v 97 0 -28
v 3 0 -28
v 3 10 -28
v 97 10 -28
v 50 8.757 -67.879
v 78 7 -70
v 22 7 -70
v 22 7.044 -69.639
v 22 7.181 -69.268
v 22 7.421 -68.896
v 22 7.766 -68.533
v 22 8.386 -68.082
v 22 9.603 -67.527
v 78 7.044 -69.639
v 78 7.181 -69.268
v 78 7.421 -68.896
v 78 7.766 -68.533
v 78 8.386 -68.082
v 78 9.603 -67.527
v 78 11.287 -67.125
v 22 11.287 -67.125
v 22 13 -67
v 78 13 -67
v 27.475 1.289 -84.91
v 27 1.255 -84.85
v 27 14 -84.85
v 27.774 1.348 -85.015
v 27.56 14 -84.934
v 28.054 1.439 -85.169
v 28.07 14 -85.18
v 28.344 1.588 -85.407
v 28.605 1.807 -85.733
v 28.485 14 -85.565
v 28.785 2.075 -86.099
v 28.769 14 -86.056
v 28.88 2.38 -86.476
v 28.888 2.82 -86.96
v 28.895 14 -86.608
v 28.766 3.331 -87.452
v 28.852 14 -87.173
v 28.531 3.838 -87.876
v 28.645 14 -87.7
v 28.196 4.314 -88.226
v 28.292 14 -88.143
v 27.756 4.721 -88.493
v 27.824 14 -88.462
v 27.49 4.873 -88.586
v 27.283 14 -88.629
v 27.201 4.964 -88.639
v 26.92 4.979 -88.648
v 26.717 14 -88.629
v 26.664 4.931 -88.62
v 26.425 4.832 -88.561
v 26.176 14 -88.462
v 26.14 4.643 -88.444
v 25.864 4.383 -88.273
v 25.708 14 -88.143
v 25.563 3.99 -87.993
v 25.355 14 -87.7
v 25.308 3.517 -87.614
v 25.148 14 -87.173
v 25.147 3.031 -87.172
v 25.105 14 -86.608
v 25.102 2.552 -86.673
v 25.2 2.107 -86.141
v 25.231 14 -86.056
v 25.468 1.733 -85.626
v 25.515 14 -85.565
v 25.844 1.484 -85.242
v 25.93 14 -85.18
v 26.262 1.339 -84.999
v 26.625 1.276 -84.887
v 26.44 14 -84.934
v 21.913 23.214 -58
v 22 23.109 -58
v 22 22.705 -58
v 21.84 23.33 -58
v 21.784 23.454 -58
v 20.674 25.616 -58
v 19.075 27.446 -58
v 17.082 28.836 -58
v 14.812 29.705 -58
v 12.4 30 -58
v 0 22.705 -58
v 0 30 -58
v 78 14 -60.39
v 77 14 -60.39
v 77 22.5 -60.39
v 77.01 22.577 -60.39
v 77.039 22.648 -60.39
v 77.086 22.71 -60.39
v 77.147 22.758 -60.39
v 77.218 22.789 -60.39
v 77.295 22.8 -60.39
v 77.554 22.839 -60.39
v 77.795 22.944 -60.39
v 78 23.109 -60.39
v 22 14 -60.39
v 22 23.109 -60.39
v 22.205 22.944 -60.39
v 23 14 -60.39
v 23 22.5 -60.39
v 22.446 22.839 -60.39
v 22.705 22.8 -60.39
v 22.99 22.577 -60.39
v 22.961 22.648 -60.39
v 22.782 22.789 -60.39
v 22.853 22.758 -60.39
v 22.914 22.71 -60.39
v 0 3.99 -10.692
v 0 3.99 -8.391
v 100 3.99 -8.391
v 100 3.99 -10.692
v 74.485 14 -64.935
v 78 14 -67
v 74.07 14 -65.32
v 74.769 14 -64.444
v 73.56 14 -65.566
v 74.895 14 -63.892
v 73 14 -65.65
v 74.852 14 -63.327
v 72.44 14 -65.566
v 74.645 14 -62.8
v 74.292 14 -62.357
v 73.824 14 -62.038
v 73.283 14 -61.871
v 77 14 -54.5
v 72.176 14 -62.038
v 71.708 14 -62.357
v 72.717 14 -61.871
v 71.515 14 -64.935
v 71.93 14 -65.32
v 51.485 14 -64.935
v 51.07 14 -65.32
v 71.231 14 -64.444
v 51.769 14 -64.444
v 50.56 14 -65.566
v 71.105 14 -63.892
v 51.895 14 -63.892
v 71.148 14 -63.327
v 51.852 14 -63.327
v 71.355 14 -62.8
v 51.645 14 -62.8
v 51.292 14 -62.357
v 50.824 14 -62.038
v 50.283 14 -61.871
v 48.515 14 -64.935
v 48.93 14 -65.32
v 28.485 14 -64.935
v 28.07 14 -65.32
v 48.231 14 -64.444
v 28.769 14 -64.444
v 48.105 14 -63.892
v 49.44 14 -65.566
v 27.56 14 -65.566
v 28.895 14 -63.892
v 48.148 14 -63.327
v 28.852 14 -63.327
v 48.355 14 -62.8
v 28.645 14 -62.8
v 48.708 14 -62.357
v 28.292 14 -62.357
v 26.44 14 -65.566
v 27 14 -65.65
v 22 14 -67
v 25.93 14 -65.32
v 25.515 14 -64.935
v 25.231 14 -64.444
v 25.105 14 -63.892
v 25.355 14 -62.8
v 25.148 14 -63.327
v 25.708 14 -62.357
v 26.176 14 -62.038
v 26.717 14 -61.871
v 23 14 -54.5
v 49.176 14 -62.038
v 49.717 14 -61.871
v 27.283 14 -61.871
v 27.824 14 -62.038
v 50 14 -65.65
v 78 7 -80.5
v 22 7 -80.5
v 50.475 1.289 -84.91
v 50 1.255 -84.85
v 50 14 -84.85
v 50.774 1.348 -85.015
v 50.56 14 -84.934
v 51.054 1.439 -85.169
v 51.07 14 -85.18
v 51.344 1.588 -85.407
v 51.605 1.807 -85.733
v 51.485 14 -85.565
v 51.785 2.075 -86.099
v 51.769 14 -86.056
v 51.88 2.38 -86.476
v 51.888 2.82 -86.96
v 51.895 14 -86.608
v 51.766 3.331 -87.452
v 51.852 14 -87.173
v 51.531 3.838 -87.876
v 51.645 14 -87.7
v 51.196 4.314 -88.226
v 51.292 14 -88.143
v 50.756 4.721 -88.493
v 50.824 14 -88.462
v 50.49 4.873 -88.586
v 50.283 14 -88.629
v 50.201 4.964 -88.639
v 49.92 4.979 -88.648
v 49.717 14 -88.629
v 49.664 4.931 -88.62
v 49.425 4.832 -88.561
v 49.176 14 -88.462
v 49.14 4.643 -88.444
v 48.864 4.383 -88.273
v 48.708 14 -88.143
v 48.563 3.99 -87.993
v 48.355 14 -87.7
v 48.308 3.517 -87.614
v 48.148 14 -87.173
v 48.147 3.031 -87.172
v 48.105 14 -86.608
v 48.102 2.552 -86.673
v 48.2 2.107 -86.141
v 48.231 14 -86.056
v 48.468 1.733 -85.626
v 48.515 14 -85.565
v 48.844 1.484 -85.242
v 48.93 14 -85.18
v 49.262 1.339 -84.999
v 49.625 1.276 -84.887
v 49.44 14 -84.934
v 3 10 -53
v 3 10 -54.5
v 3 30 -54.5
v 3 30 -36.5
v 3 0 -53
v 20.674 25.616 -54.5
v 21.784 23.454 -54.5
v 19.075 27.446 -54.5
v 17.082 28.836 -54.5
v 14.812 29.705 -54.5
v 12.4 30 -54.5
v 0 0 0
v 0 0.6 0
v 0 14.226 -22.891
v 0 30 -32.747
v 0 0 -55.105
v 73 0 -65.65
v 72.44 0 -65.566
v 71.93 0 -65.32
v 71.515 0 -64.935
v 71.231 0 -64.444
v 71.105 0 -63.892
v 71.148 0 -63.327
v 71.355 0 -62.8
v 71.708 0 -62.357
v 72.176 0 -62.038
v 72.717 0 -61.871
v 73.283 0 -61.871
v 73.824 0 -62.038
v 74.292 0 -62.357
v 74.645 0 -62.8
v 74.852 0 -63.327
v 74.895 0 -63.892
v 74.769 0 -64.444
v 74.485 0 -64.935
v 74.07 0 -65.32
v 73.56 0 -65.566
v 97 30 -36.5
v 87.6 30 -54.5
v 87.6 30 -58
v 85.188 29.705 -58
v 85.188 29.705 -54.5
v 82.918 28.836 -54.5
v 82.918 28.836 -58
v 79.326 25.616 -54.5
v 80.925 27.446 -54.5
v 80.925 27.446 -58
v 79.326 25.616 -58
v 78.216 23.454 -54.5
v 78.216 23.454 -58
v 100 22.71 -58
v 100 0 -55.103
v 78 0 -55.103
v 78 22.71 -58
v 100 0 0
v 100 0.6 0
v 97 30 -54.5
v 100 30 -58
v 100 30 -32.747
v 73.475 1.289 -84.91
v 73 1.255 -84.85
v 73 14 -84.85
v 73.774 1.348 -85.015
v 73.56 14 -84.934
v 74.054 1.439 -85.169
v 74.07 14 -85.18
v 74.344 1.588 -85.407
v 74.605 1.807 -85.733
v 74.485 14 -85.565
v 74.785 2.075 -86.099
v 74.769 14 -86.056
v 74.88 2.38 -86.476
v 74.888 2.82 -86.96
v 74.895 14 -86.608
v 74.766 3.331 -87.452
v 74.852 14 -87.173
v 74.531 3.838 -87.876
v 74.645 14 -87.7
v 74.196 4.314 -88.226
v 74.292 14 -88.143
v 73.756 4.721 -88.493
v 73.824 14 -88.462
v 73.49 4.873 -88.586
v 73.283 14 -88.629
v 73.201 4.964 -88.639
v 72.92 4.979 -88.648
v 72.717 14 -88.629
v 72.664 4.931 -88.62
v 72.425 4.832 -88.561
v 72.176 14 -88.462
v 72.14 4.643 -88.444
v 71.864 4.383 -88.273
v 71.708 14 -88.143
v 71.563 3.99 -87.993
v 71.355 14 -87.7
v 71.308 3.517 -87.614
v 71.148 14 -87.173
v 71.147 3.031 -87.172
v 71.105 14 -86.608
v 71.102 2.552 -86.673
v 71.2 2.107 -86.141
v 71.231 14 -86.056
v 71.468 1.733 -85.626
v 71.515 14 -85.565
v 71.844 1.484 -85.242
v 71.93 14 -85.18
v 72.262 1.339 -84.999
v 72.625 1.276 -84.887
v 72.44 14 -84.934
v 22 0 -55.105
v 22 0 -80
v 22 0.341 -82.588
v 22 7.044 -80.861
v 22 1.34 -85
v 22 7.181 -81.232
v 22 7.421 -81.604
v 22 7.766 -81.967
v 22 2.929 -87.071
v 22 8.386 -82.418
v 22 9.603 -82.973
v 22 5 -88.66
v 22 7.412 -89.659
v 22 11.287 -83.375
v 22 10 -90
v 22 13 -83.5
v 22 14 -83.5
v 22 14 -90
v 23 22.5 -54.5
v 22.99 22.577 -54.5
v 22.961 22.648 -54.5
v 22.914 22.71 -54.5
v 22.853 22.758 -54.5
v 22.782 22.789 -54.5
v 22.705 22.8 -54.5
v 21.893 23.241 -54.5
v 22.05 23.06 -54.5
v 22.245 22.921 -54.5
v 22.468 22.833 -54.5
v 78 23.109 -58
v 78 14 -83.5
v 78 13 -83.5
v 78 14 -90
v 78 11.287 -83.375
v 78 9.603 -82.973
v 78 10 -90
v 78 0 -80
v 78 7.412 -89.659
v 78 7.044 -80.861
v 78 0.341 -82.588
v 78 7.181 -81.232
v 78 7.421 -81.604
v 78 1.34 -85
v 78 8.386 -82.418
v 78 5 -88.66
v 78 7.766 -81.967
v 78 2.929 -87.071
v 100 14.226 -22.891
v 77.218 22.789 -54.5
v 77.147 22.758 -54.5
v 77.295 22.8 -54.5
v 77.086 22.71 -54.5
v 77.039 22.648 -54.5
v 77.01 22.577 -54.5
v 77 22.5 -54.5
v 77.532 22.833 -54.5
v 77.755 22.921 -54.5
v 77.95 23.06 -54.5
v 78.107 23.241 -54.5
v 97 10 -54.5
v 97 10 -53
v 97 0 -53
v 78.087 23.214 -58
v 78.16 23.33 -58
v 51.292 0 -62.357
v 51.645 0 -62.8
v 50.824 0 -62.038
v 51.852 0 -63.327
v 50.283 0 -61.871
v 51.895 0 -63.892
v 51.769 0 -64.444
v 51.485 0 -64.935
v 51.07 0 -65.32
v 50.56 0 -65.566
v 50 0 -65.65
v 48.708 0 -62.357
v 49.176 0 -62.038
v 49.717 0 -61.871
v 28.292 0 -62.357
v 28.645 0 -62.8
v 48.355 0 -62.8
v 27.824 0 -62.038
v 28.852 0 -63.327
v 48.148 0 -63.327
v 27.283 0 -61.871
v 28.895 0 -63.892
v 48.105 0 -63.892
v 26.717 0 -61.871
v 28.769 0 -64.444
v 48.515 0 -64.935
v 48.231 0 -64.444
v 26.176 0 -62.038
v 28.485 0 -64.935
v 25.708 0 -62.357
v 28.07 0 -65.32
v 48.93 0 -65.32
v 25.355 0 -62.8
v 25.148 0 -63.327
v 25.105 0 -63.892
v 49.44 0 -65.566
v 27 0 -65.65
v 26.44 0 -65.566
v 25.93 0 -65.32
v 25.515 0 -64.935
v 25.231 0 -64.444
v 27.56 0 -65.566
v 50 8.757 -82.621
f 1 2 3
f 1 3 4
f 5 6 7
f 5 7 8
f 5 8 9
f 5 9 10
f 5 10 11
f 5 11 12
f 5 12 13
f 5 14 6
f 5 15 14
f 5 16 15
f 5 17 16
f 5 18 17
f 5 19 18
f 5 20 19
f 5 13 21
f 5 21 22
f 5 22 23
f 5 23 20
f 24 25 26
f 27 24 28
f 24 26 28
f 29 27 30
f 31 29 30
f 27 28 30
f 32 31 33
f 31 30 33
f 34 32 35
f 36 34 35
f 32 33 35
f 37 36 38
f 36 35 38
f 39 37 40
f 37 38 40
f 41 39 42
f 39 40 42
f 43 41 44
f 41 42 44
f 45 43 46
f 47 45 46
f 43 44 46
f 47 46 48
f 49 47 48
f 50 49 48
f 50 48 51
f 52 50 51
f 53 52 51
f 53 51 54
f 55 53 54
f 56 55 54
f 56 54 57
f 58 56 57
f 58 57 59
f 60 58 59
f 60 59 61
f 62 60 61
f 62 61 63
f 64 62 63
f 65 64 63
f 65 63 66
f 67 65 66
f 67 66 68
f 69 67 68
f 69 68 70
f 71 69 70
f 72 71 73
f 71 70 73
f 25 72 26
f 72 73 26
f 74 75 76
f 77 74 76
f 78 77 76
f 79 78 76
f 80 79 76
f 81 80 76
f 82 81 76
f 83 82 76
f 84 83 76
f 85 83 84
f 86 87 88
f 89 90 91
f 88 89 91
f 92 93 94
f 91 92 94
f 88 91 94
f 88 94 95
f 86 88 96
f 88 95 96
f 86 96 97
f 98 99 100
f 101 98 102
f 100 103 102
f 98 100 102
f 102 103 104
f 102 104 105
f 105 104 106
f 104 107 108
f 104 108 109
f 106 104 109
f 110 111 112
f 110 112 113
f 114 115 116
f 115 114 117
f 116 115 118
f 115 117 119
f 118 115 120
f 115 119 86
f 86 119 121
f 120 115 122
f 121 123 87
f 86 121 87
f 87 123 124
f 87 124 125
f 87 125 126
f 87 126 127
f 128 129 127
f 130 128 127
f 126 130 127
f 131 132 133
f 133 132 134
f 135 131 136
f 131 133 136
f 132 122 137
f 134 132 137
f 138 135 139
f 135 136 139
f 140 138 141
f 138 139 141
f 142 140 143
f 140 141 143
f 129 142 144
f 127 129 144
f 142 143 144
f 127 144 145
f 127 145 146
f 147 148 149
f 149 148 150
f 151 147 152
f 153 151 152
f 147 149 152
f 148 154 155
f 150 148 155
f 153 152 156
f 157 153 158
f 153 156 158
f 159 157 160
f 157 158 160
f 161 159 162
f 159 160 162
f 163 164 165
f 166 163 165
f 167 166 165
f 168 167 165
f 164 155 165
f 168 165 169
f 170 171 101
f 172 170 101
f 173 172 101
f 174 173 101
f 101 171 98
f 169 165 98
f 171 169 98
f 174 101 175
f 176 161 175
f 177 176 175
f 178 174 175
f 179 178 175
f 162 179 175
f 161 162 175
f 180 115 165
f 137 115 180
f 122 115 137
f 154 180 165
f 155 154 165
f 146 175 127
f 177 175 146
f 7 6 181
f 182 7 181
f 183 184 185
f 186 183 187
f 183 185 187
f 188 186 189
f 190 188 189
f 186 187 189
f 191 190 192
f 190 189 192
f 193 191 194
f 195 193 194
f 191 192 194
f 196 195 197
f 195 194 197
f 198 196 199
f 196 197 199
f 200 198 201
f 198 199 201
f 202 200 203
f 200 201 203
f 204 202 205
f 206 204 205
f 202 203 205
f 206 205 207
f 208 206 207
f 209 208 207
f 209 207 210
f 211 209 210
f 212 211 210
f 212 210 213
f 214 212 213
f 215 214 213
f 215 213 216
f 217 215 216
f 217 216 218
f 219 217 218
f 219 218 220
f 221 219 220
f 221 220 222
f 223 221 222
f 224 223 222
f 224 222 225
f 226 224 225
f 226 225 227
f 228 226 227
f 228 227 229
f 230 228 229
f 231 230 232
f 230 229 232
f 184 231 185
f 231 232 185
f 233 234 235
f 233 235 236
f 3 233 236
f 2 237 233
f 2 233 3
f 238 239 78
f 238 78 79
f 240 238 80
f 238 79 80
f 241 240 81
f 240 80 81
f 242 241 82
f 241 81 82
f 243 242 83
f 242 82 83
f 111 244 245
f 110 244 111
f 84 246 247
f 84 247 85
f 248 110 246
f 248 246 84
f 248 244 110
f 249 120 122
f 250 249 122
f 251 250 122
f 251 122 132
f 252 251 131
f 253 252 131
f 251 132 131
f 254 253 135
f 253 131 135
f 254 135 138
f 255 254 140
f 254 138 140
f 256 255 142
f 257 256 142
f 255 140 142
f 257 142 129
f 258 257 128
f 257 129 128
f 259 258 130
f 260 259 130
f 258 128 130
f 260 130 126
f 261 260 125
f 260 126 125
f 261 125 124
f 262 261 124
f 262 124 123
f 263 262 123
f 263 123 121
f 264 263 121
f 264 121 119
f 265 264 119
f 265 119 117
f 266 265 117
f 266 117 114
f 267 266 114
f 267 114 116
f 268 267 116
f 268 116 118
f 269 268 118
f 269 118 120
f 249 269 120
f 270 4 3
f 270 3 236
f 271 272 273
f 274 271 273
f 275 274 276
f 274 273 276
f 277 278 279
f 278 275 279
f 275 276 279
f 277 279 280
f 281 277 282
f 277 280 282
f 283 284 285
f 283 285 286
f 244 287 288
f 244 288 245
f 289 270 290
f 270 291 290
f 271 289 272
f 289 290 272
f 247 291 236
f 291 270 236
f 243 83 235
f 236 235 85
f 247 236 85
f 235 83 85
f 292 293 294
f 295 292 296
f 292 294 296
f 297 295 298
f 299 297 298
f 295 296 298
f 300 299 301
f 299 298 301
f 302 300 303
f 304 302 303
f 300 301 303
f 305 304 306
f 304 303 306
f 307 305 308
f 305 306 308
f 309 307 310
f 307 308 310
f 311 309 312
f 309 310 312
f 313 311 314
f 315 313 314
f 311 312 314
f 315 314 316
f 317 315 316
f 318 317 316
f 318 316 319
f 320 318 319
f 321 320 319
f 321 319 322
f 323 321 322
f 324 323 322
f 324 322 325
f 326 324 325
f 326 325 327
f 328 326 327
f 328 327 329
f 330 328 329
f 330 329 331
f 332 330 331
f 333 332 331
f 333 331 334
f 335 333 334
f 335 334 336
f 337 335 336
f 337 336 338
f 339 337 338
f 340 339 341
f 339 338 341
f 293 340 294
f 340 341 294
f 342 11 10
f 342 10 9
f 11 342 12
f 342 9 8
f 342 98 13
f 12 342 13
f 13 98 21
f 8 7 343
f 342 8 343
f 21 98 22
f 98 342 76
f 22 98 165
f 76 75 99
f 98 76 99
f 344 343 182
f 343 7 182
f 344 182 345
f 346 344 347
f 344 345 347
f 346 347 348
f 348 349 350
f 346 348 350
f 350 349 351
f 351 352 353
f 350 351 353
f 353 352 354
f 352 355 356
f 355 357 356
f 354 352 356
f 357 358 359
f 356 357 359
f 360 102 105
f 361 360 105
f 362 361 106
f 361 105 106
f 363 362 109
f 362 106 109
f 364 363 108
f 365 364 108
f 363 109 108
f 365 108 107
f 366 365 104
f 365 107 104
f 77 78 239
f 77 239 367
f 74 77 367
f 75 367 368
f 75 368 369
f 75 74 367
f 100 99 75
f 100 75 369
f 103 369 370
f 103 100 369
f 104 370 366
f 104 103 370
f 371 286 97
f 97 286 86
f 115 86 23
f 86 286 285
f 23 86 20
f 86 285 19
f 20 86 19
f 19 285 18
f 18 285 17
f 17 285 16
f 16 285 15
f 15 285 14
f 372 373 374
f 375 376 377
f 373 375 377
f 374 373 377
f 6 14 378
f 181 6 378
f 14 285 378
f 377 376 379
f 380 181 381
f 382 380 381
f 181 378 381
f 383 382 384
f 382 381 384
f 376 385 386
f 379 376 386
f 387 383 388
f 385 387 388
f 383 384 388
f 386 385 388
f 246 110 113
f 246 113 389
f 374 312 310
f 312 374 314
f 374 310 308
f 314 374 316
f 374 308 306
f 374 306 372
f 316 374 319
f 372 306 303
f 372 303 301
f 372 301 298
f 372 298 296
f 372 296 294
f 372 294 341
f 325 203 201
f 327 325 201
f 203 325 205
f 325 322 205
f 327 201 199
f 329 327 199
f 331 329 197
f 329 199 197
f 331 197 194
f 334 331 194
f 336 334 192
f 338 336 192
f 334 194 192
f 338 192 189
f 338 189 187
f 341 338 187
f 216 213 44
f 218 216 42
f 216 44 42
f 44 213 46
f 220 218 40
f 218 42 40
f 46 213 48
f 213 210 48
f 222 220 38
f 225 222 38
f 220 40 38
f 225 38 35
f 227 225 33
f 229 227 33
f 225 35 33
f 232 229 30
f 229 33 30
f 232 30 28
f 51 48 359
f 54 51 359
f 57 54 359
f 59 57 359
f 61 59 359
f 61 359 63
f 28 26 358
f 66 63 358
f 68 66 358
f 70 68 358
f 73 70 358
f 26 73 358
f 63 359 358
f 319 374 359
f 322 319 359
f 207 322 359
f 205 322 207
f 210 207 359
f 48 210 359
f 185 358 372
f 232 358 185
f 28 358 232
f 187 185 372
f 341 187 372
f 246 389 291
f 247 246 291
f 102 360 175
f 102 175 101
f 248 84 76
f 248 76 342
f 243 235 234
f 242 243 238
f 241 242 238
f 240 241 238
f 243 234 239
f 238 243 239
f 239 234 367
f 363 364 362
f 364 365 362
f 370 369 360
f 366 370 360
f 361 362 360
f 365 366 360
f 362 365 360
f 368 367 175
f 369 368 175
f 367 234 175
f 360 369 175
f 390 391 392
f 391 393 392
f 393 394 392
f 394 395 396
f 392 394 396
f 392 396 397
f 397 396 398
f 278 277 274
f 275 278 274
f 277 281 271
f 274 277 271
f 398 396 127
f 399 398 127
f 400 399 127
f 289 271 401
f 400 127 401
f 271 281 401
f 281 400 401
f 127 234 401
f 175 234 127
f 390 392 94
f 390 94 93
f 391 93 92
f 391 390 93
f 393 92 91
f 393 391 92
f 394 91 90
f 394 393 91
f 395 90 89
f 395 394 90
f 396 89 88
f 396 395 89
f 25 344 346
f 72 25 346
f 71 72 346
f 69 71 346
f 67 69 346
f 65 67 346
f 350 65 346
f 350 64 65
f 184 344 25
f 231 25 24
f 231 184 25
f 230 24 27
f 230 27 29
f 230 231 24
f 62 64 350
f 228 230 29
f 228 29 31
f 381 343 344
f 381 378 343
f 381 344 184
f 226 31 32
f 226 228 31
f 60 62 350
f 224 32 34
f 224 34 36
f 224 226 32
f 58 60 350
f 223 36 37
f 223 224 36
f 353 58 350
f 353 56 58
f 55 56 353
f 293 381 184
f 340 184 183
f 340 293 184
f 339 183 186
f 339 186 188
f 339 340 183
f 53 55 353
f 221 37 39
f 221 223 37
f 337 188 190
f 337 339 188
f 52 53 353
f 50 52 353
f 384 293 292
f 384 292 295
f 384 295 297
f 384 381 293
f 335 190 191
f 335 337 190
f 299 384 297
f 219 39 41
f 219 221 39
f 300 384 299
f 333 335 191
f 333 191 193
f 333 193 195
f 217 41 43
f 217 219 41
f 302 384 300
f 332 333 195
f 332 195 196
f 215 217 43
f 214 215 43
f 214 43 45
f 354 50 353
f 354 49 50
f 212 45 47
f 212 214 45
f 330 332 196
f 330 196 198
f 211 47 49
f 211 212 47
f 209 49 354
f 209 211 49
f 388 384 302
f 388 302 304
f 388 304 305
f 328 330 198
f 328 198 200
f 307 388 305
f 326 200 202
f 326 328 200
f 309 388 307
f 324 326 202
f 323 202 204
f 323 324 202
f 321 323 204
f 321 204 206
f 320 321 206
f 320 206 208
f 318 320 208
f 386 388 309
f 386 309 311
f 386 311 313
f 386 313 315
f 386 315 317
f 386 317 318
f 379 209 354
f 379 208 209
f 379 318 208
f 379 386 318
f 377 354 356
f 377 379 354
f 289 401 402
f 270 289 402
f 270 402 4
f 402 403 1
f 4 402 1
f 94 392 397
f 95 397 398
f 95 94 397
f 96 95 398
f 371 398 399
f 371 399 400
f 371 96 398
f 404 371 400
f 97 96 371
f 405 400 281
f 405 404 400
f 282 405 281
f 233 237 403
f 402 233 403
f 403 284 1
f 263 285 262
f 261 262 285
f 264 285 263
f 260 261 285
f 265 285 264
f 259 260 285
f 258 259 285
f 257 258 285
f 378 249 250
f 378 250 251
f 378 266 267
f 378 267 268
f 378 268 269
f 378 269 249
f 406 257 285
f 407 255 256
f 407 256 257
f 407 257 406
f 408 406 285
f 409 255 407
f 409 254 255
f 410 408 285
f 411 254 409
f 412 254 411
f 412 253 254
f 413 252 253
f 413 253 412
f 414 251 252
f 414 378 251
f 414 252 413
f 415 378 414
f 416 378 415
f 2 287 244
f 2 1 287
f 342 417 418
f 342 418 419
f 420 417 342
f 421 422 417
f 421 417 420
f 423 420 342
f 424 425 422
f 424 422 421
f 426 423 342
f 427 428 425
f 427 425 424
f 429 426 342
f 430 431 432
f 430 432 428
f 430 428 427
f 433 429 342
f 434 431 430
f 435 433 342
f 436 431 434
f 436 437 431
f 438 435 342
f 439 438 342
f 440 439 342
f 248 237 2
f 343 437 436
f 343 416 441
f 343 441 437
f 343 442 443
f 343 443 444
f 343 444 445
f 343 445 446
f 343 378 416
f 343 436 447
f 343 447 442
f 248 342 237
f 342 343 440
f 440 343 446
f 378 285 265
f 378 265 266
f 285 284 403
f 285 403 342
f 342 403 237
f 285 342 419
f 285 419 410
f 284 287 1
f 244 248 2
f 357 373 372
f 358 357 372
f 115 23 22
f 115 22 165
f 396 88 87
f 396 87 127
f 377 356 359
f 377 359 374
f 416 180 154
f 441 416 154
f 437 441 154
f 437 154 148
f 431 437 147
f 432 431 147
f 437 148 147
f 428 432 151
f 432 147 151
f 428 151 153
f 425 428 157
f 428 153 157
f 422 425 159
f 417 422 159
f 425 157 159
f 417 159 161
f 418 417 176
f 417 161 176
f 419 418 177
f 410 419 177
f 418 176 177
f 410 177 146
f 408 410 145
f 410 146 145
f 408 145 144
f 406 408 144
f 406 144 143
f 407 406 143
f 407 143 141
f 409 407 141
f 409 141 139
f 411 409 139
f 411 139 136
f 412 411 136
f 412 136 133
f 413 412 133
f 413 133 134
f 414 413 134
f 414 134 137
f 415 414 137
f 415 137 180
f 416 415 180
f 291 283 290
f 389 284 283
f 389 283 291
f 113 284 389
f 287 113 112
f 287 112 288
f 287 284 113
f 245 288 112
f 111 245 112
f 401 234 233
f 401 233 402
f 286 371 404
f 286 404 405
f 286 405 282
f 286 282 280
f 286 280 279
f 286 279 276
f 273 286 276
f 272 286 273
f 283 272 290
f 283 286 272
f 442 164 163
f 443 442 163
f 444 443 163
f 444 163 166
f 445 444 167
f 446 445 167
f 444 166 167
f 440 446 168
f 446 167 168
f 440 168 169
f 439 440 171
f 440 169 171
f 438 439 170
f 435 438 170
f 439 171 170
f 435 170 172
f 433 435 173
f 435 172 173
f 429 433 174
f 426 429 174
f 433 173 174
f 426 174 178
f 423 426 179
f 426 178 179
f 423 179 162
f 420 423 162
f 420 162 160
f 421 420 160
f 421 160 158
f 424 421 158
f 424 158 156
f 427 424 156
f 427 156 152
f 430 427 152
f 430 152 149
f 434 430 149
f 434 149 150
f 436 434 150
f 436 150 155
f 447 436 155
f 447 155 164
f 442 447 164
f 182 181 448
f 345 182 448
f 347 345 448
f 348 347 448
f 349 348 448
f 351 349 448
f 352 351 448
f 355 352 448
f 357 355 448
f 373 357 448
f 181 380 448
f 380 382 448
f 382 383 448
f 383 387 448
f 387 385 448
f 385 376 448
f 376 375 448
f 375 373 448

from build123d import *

# Parameters (mm, degrees)
RESSALTO_EXTRUS_O1_DEPTH = 30
CORTE_EXTRUS_O1_DEPTH    = 100
ESBO_O4_W                = 94
ESBO_O4_H                = 25
CORTE_EXTRUS_O2_DEPTH    = 10
ESBO_O5_W                = 94
ESBO_O5_H                = 18
CORTE_EXTRUS_O3_DEPTH    = 20
CORTE_EXTRUS_O7_START    = -3
CORTE_EXTRUS_O7_DEPTH    = 94
ESBO_O8_W                = 32
ESBO_O8_H                = 15
CORTE_EXTRUS_O8_DEPTH    = 56
ESBO_O9_W                = 16.5
ESBO_O9_H                = 8
CORTE_EXTRUS_O9_DEPTH    = 56
FILETE1_SIZE             = 3
FILETE1_SIZE_2           = 6
FILETE2_SIZE             = 3
FILETE2_SIZE_2           = 6
FILETE3_R                = 10
ESBO_O12_W               = 32
ESBO_O12_H               = 1
CORTE_EXTRUS_O12_DEPTH   = 68
CORTE_EXTRUS_O13_REACH   = 121.432
ESBO_O14_W               = 56
ESBO_O14_H               = 16
CORTE_EXTRUS_O14_DEPTH   = 138.840487586
ESBO_O16_R               = 1.9
CORTE_EXTRUS_O15_DEPTH   = 136.484316502
ESBO_O19_W               = 5.89
ESBO_O19_H               = 8.8
RESSALTO_EXTRUS_O4_DEPTH = 1
ESBO_O20_W               = 5.89
ESBO_O20_H               = 8.8
RESSALTO_EXTRUS_O5_DEPTH = 1
FILETE5_R                = 10
FILETE6_R                = 0.3
FILETE7_R                = 1
CORTE_EXTRUS_O17_DEPTH   = 22
CORTE_EXTRUS_O18_DEPTH   = 22
CORTE_EXTRUS_O19_DEPTH   = 124


with BuildPart() as part:
    # Esboço2 → Ressalto-extrusão1 (new body)
    with BuildSketch(Plane(origin=(0, 0, 0), x_dir=(1, 0, 0), z_dir=(0, 1, 0))):
        Polygon((0, 0), (0, 58), (22, 58), (22, 90), (78, 90), (78, 58), (100, 58), (100, 0), align=None)
    extrude(amount=RESSALTO_EXTRUS_O1_DEPTH)

    # Esboço3 → Corte-extrusão1 (cut)
    with BuildSketch(Plane(origin=(100, 0, 0), x_dir=(0, 0, -1), z_dir=(1, 0, 0))):
        Polygon((0, 0.6), (9.828405069, 4.570933406), (22.126818959, 14.890527965), (31.568264957, 30), (0, 30), align=None)
    extrude(amount=-CORTE_EXTRUS_O1_DEPTH, mode=Mode.SUBTRACT)

    # Esboço4 → Corte-extrusão2 (cut)
    with BuildSketch(Plane.XZ):
        with Locations((50, -40.5)):
            Rectangle(ESBO_O4_W, ESBO_O4_H)
    extrude(amount=-CORTE_EXTRUS_O2_DEPTH, mode=Mode.SUBTRACT)

    # Esboço5 → Corte-extrusão3 (cut)
    with BuildSketch(Plane(origin=(0, 30, 0), x_dir=(1, 0, 0), z_dir=(0, 1, 0))):
        with Locations((50, 45.5)):
            Rectangle(ESBO_O5_W, ESBO_O5_H)
    extrude(amount=-CORTE_EXTRUS_O3_DEPTH, mode=Mode.SUBTRACT)

    # Esboço7 → Corte-extrusão7 (cut)
    with BuildSketch(Plane(origin=(100, 0, 0), x_dir=(0, 0, -1), z_dir=(1, 0, 0)).offset(CORTE_EXTRUS_O7_START)):
        Polygon((28, 10), (36.5, 30), (36.5, 10), align=None)
    extrude(amount=-CORTE_EXTRUS_O7_DEPTH, mode=Mode.SUBTRACT)

    # Esboço8 → Corte-extrusão8 (cut)
    with BuildSketch(Plane(origin=(78, 0, 0), x_dir=(0, 0, -1), z_dir=(1, 0, 0))):
        with Locations((74, 22.5)):
            Rectangle(ESBO_O8_W, ESBO_O8_H)
    extrude(amount=-CORTE_EXTRUS_O8_DEPTH, mode=Mode.SUBTRACT)

    # Esboço9 → Corte-extrusão9 (cut)
    with BuildSketch(Plane(origin=(78, 0, 0), x_dir=(0, 0, -1), z_dir=(1, 0, 0))):
        with Locations((75.25, 11)):
            Rectangle(ESBO_O9_W, ESBO_O9_H)
    extrude(amount=-CORTE_EXTRUS_O9_DEPTH, mode=Mode.SUBTRACT)

    # Filete1
    # an asymmetric fillet: 6, 3 mm, written as the material it adds along each edge
    with BuildSketch(Plane(origin=(78, 7, -67), x_dir=(0, 0, -1), z_dir=(-1, 0, 0))) as filete1_piece_1:
        with BuildLine():
            Bezier((FILETE1_SIZE, 0), (0, 0), (0, -FILETE1_SIZE_2), weights=[1, 0.707106781, 1])
            Line((0, -FILETE1_SIZE_2), (0, 0))
            Line((0, 0), (FILETE1_SIZE, 0))
        make_face()
    extrude(amount=56)

    # Filete2
    # an asymmetric fillet: 6, 3 mm, written as the material it adds along each edge
    with BuildSketch(Plane(origin=(78, 7, -83.5), x_dir=(0, 0, 1), z_dir=(-1, 0, 0))) as filete2_piece_1:
        with BuildLine():
            Bezier((FILETE2_SIZE, 0), (0, 0), (0, FILETE2_SIZE_2), weights=[1, 0.707106781, 1])
            Line((0, FILETE2_SIZE_2), (0, 0))
            Line((0, 0), (FILETE2_SIZE, 0))
        make_face()
    extrude(amount=56)

    # Filete3
    filete3_edges = [part.edges().sort_by_distance(p)[0] for p in [
        (50, 0, -90),
    ]]
    fillet(filete3_edges, radius=FILETE3_R)

    # Esboço12 → Corte-extrusão12 (cut)
    with BuildSketch(Plane.ZY.offset(-22)):
        with Locations((-74, 14.5)):
            Rectangle(ESBO_O12_W, ESBO_O12_H)
    extrude(amount=-CORTE_EXTRUS_O12_DEPTH, mode=Mode.SUBTRACT)

    # Esboço14 → Corte-extrusão13 (cut, up to next)
    with BuildSketch(Plane(origin=(0, 0, -58), x_dir=(-1, 0, 0), z_dir=(0, 0, -1)), mode=Mode.PRIVATE) as corte_extrus_o13_sk1:
        with Locations((-50, 22)):
            Rectangle(ESBO_O14_W, ESBO_O14_H)
    corte_extrus_o13_tool1 = extrude(corte_extrus_o13_sk1.sketch, amount=-CORTE_EXTRUS_O13_REACH, mode=Mode.PRIVATE) & part.part
    add(corte_extrus_o13_tool1.solids().sort_by_distance((50, 22, -58))[0], mode=Mode.SUBTRACT)

    # Esboço15 → Corte-extrusão14 (cut, through all)
    with BuildSketch(Plane(origin=(100, 0, 0), x_dir=(0, 0, -1), z_dir=(1, 0, 0))):
        Polygon((9.048997211, 4.256032191), (10.048997211, 4.256032191), (10.048997211, 4.756032191), align=None)
    extrude(amount=-CORTE_EXTRUS_O14_DEPTH, mode=Mode.SUBTRACT)

    # Esboço16 → Corte-extrusão15 (cut, through all)
    with BuildSketch(Plane(origin=(0, 14, 0), x_dir=(1, 0, 0), z_dir=(0, 1, 0))):
        with Locations(Location((73, 86.75, 0), (0, 0, 270))):
            Circle(ESBO_O16_R)
        with Locations(Location((27, 86.75, 0), (0, 0, 270))):
            Circle(ESBO_O16_R)
        with Locations(Location((73, 63.75, 0), (0, 0, 90))):
            Circle(ESBO_O16_R)
        with Locations(Location((27, 63.75, 0), (0, 0, 90))):
            Circle(ESBO_O16_R)
        with Locations(Location((50, 86.75, 0), (0, 0, 270))):
            Circle(ESBO_O16_R)
        with Locations(Location((50, 63.75, 0), (0, 0, 90))):
            Circle(ESBO_O16_R)
    extrude(amount=-CORTE_EXTRUS_O15_DEPTH, mode=Mode.SUBTRACT)

    # Esboço19 → Ressalto-extrusão4 (add)
    with BuildSketch(Plane.ZY.offset(-78)):
        with Locations((-57.445, 18.4)):
            Rectangle(ESBO_O19_W, ESBO_O19_H)
    extrude(amount=RESSALTO_EXTRUS_O4_DEPTH)

    # Esboço20 → Ressalto-extrusão5 (add)
    with BuildSketch(Plane(origin=(22, 0, 0), x_dir=(0, 0, -1), z_dir=(1, 0, 0))):
        with Locations((57.445, 18.4)):
            Rectangle(ESBO_O20_W, ESBO_O20_H)
    extrude(amount=RESSALTO_EXTRUS_O5_DEPTH)

    # Filete5
    # the kernel refuses this fillet: 10 mm, written as the material it takes off along each edge
    with BuildSketch(Plane(origin=(22, 30, -82), x_dir=(0, -1, 0), z_dir=(0, 0, 1))) as filete5_piece_1_section:
        with BuildLine():
            CenterArc((10, -9.6), FILETE5_R, 106.260204708, 73.739795292)
            Line((0, -9.6), (0, 0))
            Line((0, 0), (7.2, 0))
        make_face()
    filete5_piece_1 = extrude(amount=51.5, mode=Mode.PRIVATE)
    filete5_piece_1 = split(filete5_piece_1, bisect_by=Plane(origin=(18.412, 35.429115934, -38.807374272), z_dir=(0, -0.39114064034485163, -0.9203309184584747)), keep=Keep.TOP, mode=Mode.PRIVATE)
    add(filete5_piece_1, mode=Mode.SUBTRACT)
    with BuildSketch(Plane(origin=(78, 30, -82), x_dir=(0, -1, 0), z_dir=(0, 0, 1))) as filete5_piece_2_section:
        with BuildLine():
            CenterArc((10, 9.6), FILETE5_R, 180, 73.739795292)
            Line((0, 9.6), (0, 0))
            Line((0, 0), (7.2, 0))
        make_face()
    filete5_piece_2 = extrude(amount=51.5, mode=Mode.PRIVATE)
    filete5_piece_2 = split(filete5_piece_2, bisect_by=Plane(origin=(81.588, 35.429115934, -38.807374272), z_dir=(0, -0.39114064034485163, -0.9203309184584747)), keep=Keep.TOP, mode=Mode.PRIVATE)
    add(filete5_piece_2, mode=Mode.SUBTRACT)

    # Filete6
    filete6_edges = [part.edges().sort_by_distance(p)[0] for p in [
        (77, 22.8, -57.445),
        (23, 22.8, -57.445),
    ]]
    fillet(filete6_edges, radius=FILETE6_R)

    # Filete7
    # the kernel refuses this fillet: 1 mm, written as the material it adds along each edge
    with BuildSketch(Plane(origin=(22, 22.8, -62.231658327), x_dir=(0.9999999978354762, -6.579549656677086e-05, 0), z_dir=(0, 0, 1))) as filete7_piece_1_section:
        with BuildLine():
            CenterArc((0.722798557, 0.999846475), FILETE7_R, 200.212199082, 68.783803201)
            Line((-0.215620926, 0.654348465), (-0.309462874, 0.619798664))
            ThreePointArc((-0.309462874, 0.619798664), (-0.197149972, 0.297735075), (-0.095998158, -0.028006316))
            Line((-0.095998158, -0.028006316), (6.58e-06, -0.1))
            ThreePointArc((6.58e-06, -0.1), (0.700006578, -0.099953943), (0.703524171, -0.099984648))
            Line((0.703524171, -0.099984648), (0.705276388, 0))
        make_face()
    filete7_piece_1 = extrude(amount=7.731658327, mode=Mode.PRIVATE)
    filete7_piece_1 = split(filete7_piece_1, bisect_by=Plane(origin=(22.2637133, 22.819694308, -60.39), z_dir=(0, 0, 1)), keep=Keep.TOP, mode=Mode.PRIVATE)
    filete7_piece_1 = split(filete7_piece_1, bisect_by=Plane(origin=(22, 22.819694308, -59.195), z_dir=(1, 0, 0)), keep=Keep.TOP, mode=Mode.PRIVATE)
    filete7_piece_1 = split(filete7_piece_1, bisect_by=Plane(origin=(22.2637133, 22.819694308, -58), z_dir=(0, 0, -1)), keep=Keep.TOP, mode=Mode.PRIVATE)
    add(filete7_piece_1)
    with BuildSketch(Plane(origin=(22, 22.8, -58), x_dir=(0.9999999978354763, -6.579549656677353e-05, 0), z_dir=(0, 0, 1))) as filete7_piece_2_section:
        with BuildLine():
            CenterArc((0.722798557, 0.999846475), FILETE7_R, 200.212199082, 68.783803201)
            Line((-0.215620926, 0.654348465), (-0.309462874, 0.619798664))
            ThreePointArc((-0.309462874, 0.619798664), (-0.197149972, 0.297735075), (-0.095998158, -0.028006316))
            Line((-0.095998158, -0.028006316), (6.58e-06, -0.1))
            ThreePointArc((6.58e-06, -0.1), (0.700006578, -0.099953943), (0.703524171, -0.099984648))
            Line((0.703524171, -0.099984648), (0.705276388, 0))
        make_face()
    filete7_piece_2 = extrude(amount=3.5, mode=Mode.PRIVATE)
    filete7_piece_2 = split(filete7_piece_2, bisect_by=Plane(origin=(22, 22.819694308, -56.25), z_dir=(1, 0, 0)), keep=Keep.TOP, mode=Mode.PRIVATE)
    add(filete7_piece_2)
    with BuildSketch(Plane(origin=(22, 22.8, -58), x_dir=(0.9999999978354763, -6.579549656677353e-05, 0), z_dir=(0, 0, 1))) as filete7_piece_3_section:
        with BuildLine():
            CenterArc((0.722798557, 0.999846475), FILETE7_R, 200.212199082, 68.783803201)
            Line((-0.215620926, 0.654348465), (-0.309462874, 0.619798664))
            ThreePointArc((-0.309462874, 0.619798664), (-0.197149972, 0.297735075), (-0.095998158, -0.028006316))
            Line((-0.095998158, -0.028006316), (6.58e-06, -0.1))
            ThreePointArc((6.58e-06, -0.1), (0.700006578, -0.099953943), (0.703524171, -0.099984648))
            Line((0.703524171, -0.099984648), (0.705276388, 0))
        make_face()
    filete7_piece_3 = extrude(amount=3.5, mode=Mode.PRIVATE)
    filete7_piece_3 = split(filete7_piece_3, bisect_by=Plane(origin=(22, 23.088269834, -56.25), z_dir=(-1, 0, 0)), keep=Keep.TOP, mode=Mode.PRIVATE)
    add(filete7_piece_3)
    with BuildSketch(Plane(origin=(78, 22.8, -62.231658327), x_dir=(-0.9999999978354763, -6.579549656677353e-05, 0), z_dir=(0, 0, 1))) as filete7_piece_4_section:
        with BuildLine():
            CenterArc((0.722798557, -0.999846475), FILETE7_R, 91.003997717, 68.783803201)
            Line((-0.215620926, -0.654348465), (-0.309462874, -0.619798664))
            ThreePointArc((-0.309462874, -0.619798664), (-0.197149972, -0.297735075), (-0.095998158, 0.028006316))
            Line((-0.095998158, 0.028006316), (6.58e-06, 0.1))
            ThreePointArc((6.58e-06, 0.1), (0.700006578, 0.099953943), (0.703524171, 0.099984648))
            Line((0.703524171, 0.099984648), (0.705276388, 0))
        make_face()
    filete7_piece_4 = extrude(amount=7.731658327, mode=Mode.PRIVATE)
    filete7_piece_4 = split(filete7_piece_4, bisect_by=Plane(origin=(78, 22.819694308, -59.195), z_dir=(-1, 0, 0)), keep=Keep.TOP, mode=Mode.PRIVATE)
    filete7_piece_4 = split(filete7_piece_4, bisect_by=Plane(origin=(77.7362867, 22.819694308, -60.39), z_dir=(0, 0, 1)), keep=Keep.TOP, mode=Mode.PRIVATE)
    filete7_piece_4 = split(filete7_piece_4, bisect_by=Plane(origin=(77.7362867, 22.819694308, -58), z_dir=(0, 0, -1)), keep=Keep.TOP, mode=Mode.PRIVATE)
    add(filete7_piece_4)
    with BuildSketch(Plane(origin=(78, 22.8, -58), x_dir=(-0.9999999978354763, -6.57954965667722e-05, 0), z_dir=(0, 0, 1))) as filete7_piece_5_section:
        with BuildLine():
            CenterArc((0.722798557, -0.999846475), FILETE7_R, 91.003997717, 68.783803201)
            Line((-0.215620926, -0.654348465), (-0.309462874, -0.619798664))
            ThreePointArc((-0.309462874, -0.619798664), (-0.197149972, -0.297735075), (-0.095998158, 0.028006316))
            Line((-0.095998158, 0.028006316), (6.58e-06, 0.1))
            ThreePointArc((6.58e-06, 0.1), (0.700006578, 0.099953943), (0.703524171, 0.099984648))
            Line((0.703524171, 0.099984648), (0.705276388, 0))
        make_face()
    filete7_piece_5 = extrude(amount=3.5, mode=Mode.PRIVATE)
    filete7_piece_5 = split(filete7_piece_5, bisect_by=Plane(origin=(78, 22.819694308, -56.25), z_dir=(-1, 0, 0)), keep=Keep.TOP, mode=Mode.PRIVATE)
    add(filete7_piece_5)
    with BuildSketch(Plane(origin=(78, 22.8, -58), x_dir=(-0.9999999978354763, -6.57954965667722e-05, 0), z_dir=(0, 0, 1))) as filete7_piece_6_section:
        with BuildLine():
            CenterArc((0.722798557, -0.999846475), FILETE7_R, 91.003997717, 68.783803201)
            Line((-0.215620926, -0.654348465), (-0.309462874, -0.619798664))
            ThreePointArc((-0.309462874, -0.619798664), (-0.197149972, -0.297735075), (-0.095998158, 0.028006316))
            Line((-0.095998158, 0.028006316), (6.58e-06, 0.1))
            ThreePointArc((6.58e-06, 0.1), (0.700006578, 0.099953943), (0.703524171, 0.099984648))
            Line((0.703524171, 0.099984648), (0.705276388, 0))
        make_face()
    filete7_piece_6 = extrude(amount=3.5, mode=Mode.PRIVATE)
    filete7_piece_6 = split(filete7_piece_6, bisect_by=Plane(origin=(78, 23.088269834, -56.25), z_dir=(1, 0, 0)), keep=Keep.TOP, mode=Mode.PRIVATE)
    add(filete7_piece_6)

    # Esboço22 → Corte-extrusão17 (cut)
    with BuildSketch(Plane.ZY):
        Polygon((-58, 0), (-58, 22.70530007), (-55.105367164, 0), align=None)
    extrude(amount=-CORTE_EXTRUS_O17_DEPTH, mode=Mode.SUBTRACT)

    # Esboço23 → Corte-extrusão18 (cut)
    with BuildSketch(Plane(origin=(100, 0, 0), x_dir=(0, 0, -1), z_dir=(1, 0, 0))):
        Polygon((58, 0), (55.102867158, 0), (58, 22.71), align=None)
    extrude(amount=-CORTE_EXTRUS_O18_DEPTH, mode=Mode.SUBTRACT)

    # Esboço27 → Corte-extrusão19 (cut)
    with BuildSketch(Plane.ZY):
        Polygon((-31.568264957, 30), (-22.126818959, 14.890527965), (-10.048997211, 4.756032191), (-7.995032748, 3.989987748), (-10.691784821, 3.989987748), (-22.89093609, 14.226291078), (-32.747443361, 30), align=None)
    extrude(amount=-CORTE_EXTRUS_O19_DEPTH, mode=Mode.SUBTRACT)


solid = part.part
